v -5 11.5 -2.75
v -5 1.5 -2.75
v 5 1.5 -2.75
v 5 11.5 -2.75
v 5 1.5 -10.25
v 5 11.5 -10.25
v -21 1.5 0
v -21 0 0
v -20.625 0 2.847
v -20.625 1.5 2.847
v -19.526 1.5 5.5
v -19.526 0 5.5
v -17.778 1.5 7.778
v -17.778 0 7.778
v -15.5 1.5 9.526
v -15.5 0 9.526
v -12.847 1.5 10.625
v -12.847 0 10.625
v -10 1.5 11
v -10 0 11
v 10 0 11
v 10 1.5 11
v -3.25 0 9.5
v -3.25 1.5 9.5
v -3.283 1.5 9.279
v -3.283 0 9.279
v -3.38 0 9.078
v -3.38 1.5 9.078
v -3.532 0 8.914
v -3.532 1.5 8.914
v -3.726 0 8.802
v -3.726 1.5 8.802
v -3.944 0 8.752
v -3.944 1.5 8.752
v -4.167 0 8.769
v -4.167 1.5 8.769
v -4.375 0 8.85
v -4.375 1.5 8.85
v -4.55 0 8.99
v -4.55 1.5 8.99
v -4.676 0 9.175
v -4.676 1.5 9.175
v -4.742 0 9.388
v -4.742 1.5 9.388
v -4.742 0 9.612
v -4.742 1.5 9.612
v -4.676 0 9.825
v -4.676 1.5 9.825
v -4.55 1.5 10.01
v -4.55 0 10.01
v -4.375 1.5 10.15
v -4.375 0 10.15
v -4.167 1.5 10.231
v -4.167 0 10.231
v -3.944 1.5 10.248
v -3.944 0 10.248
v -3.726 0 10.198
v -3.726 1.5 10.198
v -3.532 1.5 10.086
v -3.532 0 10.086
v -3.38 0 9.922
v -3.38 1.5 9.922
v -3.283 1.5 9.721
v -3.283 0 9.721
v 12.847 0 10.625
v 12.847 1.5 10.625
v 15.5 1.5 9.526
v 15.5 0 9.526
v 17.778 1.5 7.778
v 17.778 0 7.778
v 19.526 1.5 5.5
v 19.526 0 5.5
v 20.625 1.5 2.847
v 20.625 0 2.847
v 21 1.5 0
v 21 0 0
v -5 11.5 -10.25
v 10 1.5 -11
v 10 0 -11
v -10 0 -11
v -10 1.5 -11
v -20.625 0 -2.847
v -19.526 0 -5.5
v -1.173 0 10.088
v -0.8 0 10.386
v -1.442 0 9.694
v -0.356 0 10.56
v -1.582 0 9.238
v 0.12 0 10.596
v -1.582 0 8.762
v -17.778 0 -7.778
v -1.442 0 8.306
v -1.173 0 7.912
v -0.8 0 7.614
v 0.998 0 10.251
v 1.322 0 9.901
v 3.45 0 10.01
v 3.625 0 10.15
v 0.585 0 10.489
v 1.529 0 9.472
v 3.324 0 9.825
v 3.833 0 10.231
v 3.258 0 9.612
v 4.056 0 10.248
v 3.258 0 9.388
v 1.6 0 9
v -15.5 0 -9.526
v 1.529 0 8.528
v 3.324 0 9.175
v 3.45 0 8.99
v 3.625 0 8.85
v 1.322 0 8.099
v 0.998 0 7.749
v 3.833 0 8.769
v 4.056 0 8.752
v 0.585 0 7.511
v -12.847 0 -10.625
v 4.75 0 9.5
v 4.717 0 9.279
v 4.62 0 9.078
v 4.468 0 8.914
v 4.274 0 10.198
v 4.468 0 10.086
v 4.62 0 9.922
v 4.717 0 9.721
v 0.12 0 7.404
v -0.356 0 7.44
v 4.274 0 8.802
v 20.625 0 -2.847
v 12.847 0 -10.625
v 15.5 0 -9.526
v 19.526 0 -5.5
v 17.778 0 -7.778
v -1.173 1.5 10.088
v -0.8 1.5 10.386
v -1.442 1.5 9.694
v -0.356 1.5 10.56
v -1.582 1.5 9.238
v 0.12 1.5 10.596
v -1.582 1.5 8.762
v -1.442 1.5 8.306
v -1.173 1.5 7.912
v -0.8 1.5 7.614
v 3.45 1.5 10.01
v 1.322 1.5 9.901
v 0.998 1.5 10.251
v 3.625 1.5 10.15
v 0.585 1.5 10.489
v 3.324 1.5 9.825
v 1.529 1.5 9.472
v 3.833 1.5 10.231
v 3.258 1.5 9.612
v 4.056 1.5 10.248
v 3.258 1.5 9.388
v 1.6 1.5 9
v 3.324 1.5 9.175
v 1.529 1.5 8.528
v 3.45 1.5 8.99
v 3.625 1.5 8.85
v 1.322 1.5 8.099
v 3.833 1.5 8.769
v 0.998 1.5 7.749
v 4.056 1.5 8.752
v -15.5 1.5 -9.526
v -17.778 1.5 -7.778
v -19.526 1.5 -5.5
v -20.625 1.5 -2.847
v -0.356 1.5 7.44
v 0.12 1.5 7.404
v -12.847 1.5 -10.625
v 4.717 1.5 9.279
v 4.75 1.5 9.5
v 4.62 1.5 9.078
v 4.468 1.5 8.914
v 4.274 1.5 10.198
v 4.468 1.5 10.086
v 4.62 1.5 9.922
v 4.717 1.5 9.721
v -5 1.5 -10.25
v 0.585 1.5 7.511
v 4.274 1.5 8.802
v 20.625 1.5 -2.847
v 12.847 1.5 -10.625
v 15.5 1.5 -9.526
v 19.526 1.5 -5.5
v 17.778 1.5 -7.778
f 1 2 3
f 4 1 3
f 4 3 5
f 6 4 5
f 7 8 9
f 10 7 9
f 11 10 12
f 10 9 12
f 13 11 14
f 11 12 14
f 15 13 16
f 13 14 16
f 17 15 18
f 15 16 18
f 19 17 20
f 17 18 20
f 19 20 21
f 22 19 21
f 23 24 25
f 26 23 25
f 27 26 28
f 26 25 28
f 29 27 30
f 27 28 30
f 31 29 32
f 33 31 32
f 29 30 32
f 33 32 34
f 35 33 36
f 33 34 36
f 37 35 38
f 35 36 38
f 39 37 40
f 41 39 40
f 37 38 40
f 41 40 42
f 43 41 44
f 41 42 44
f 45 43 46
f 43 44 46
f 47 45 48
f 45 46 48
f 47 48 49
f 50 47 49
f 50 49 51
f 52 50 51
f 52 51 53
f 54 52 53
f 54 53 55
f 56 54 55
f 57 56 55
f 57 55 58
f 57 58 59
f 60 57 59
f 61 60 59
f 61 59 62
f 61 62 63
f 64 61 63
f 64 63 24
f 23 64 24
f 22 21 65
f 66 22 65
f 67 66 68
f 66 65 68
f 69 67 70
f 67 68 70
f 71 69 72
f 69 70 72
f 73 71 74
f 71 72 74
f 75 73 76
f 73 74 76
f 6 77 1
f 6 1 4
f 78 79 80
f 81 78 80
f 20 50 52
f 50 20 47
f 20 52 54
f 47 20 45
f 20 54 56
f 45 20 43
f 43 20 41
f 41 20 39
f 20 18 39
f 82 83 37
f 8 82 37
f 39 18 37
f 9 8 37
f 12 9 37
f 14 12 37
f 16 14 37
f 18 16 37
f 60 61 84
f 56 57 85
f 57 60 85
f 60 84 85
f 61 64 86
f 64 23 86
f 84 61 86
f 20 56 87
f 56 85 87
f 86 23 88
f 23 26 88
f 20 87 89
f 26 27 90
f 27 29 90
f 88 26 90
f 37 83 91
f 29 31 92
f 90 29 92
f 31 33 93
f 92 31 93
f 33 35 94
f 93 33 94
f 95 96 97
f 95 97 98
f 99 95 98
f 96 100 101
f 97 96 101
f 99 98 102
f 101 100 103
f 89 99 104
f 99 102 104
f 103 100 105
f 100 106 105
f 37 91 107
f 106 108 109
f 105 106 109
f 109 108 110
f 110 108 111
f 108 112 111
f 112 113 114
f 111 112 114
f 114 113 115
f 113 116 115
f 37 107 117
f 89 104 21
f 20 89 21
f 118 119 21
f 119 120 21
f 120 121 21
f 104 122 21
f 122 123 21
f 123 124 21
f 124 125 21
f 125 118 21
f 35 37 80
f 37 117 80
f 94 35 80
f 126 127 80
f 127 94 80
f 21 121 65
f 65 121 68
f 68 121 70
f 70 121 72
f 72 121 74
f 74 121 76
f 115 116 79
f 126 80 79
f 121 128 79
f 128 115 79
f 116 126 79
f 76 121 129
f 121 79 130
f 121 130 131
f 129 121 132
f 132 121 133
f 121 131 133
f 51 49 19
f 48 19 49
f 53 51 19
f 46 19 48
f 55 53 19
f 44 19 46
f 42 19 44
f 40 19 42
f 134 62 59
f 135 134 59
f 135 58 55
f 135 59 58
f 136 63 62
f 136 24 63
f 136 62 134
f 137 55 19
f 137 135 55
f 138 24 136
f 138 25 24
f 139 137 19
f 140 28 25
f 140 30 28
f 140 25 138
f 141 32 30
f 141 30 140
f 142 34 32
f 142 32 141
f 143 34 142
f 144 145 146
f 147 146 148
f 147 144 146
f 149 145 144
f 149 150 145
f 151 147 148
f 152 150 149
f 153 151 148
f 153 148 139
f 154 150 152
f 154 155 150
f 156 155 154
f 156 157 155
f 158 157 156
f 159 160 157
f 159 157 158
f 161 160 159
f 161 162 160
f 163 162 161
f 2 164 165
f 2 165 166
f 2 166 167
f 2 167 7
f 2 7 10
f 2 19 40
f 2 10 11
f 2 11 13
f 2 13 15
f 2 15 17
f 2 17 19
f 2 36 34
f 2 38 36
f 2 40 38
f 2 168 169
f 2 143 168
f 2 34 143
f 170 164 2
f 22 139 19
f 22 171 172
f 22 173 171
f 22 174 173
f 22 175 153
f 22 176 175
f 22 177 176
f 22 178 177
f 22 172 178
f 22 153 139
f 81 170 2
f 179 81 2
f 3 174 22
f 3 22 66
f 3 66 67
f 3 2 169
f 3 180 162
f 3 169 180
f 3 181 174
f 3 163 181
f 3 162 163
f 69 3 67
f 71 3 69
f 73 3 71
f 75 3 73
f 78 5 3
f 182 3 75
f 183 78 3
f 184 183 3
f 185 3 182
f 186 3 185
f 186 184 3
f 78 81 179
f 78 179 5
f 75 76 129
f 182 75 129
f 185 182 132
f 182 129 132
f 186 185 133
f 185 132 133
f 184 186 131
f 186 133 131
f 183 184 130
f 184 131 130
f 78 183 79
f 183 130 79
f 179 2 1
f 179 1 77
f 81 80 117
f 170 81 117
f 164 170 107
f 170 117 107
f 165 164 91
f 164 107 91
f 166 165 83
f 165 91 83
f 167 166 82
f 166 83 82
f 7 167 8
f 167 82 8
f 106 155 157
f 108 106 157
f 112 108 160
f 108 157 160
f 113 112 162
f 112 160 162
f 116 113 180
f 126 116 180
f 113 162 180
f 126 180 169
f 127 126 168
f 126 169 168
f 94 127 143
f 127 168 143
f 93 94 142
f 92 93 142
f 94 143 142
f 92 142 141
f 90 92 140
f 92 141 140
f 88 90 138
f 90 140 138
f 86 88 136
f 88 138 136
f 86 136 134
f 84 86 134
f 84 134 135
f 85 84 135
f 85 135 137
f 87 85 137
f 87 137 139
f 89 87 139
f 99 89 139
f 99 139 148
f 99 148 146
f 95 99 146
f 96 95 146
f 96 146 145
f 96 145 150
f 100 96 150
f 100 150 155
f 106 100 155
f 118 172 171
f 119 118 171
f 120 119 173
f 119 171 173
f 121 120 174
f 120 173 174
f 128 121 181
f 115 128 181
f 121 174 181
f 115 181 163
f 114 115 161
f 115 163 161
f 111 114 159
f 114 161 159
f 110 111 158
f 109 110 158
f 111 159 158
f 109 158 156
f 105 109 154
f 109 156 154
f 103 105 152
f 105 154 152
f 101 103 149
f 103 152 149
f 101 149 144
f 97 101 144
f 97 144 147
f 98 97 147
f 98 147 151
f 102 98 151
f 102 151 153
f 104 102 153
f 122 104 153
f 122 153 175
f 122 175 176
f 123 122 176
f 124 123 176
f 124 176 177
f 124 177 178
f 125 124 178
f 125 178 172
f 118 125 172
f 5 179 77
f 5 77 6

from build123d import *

# Parameters (mm, degrees)
BOSS_EXTRUDE1_DEPTH = 1.5
SKETCH2_W           = 10
SKETCH2_H           = 7.5
BOSS_EXTRUDE2_DEPTH = 10
SKETCH3_R           = 1.6
SKETCH3_R_2         = 0.75
CUT_EXTRUDE1_DEPTH  = 2.5


with BuildPart() as part:
    # Sketch1 → Boss-Extrude1 (new body)
    with BuildSketch(Plane(origin=(0, 0, 0), x_dir=(1, 0, 0), z_dir=(0, 1, 0))):
        with BuildLine():
            Line((-21, 0), (-10, 0))
            Line((-10, 0), (0, 0))
            Line((0, 0), (0, 11))
            Line((0, 11), (-10, 11))
            ThreePointArc((-10, 11), (-17.778174593, 7.778174593), (-21, 0))
        make_face()
        with BuildLine():
            Line((0, 0), (-10, 0))
            Line((-10, 0), (-21, 0))
            ThreePointArc((-21, 0), (-17.778174593, -7.778174593), (-10, -11))
            Line((-10, -11), (0, -11))
            Line((0, -11), (0, 0))
        make_face()
        with BuildLine():
            Line((10, 0), (0, 0))
            Line((0, 0), (0, -11))
            Line((0, -11), (10, -11))
            ThreePointArc((10, -11), (17.778174593, -7.778174593), (21, 0))
            Line((21, 0), (10, 0))
        make_face()
        with BuildLine():
            Line((0, 11), (0, 0))
            Line((0, 0), (10, 0))
            Line((10, 0), (21, 0))
            ThreePointArc((21, 0), (17.778174593, 7.778174593), (10, 11))
            Line((10, 11), (0, 11))
        make_face()
    extrude(amount=BOSS_EXTRUDE1_DEPTH)

    # Sketch2 → Boss-Extrude2 (add)
    with BuildSketch(Plane(origin=(0, 1.5, 0), x_dir=(1, 0, 0), z_dir=(0, 1, 0))):
        with Locations((0, 6.5)):
            Rectangle(SKETCH2_W, SKETCH2_H)
    extrude(amount=BOSS_EXTRUDE2_DEPTH)

    # Sketch3 → Cut-Extrude1 (cut, through all)
    with BuildSketch(Plane(origin=(0, 1.5, 0), x_dir=(1, 0, 0), z_dir=(0, 1, 0))):
        with Locations((0, -9)):
            Circle(SKETCH3_R)
        with Locations((-4, -9.5)):
            Circle(SKETCH3_R_2)
        with Locations((4, -9.5)):
            Circle(SKETCH3_R_2)
    extrude(amount=-CUT_EXTRUDE1_DEPTH, mode=Mode.SUBTRACT)


solid = part.part
